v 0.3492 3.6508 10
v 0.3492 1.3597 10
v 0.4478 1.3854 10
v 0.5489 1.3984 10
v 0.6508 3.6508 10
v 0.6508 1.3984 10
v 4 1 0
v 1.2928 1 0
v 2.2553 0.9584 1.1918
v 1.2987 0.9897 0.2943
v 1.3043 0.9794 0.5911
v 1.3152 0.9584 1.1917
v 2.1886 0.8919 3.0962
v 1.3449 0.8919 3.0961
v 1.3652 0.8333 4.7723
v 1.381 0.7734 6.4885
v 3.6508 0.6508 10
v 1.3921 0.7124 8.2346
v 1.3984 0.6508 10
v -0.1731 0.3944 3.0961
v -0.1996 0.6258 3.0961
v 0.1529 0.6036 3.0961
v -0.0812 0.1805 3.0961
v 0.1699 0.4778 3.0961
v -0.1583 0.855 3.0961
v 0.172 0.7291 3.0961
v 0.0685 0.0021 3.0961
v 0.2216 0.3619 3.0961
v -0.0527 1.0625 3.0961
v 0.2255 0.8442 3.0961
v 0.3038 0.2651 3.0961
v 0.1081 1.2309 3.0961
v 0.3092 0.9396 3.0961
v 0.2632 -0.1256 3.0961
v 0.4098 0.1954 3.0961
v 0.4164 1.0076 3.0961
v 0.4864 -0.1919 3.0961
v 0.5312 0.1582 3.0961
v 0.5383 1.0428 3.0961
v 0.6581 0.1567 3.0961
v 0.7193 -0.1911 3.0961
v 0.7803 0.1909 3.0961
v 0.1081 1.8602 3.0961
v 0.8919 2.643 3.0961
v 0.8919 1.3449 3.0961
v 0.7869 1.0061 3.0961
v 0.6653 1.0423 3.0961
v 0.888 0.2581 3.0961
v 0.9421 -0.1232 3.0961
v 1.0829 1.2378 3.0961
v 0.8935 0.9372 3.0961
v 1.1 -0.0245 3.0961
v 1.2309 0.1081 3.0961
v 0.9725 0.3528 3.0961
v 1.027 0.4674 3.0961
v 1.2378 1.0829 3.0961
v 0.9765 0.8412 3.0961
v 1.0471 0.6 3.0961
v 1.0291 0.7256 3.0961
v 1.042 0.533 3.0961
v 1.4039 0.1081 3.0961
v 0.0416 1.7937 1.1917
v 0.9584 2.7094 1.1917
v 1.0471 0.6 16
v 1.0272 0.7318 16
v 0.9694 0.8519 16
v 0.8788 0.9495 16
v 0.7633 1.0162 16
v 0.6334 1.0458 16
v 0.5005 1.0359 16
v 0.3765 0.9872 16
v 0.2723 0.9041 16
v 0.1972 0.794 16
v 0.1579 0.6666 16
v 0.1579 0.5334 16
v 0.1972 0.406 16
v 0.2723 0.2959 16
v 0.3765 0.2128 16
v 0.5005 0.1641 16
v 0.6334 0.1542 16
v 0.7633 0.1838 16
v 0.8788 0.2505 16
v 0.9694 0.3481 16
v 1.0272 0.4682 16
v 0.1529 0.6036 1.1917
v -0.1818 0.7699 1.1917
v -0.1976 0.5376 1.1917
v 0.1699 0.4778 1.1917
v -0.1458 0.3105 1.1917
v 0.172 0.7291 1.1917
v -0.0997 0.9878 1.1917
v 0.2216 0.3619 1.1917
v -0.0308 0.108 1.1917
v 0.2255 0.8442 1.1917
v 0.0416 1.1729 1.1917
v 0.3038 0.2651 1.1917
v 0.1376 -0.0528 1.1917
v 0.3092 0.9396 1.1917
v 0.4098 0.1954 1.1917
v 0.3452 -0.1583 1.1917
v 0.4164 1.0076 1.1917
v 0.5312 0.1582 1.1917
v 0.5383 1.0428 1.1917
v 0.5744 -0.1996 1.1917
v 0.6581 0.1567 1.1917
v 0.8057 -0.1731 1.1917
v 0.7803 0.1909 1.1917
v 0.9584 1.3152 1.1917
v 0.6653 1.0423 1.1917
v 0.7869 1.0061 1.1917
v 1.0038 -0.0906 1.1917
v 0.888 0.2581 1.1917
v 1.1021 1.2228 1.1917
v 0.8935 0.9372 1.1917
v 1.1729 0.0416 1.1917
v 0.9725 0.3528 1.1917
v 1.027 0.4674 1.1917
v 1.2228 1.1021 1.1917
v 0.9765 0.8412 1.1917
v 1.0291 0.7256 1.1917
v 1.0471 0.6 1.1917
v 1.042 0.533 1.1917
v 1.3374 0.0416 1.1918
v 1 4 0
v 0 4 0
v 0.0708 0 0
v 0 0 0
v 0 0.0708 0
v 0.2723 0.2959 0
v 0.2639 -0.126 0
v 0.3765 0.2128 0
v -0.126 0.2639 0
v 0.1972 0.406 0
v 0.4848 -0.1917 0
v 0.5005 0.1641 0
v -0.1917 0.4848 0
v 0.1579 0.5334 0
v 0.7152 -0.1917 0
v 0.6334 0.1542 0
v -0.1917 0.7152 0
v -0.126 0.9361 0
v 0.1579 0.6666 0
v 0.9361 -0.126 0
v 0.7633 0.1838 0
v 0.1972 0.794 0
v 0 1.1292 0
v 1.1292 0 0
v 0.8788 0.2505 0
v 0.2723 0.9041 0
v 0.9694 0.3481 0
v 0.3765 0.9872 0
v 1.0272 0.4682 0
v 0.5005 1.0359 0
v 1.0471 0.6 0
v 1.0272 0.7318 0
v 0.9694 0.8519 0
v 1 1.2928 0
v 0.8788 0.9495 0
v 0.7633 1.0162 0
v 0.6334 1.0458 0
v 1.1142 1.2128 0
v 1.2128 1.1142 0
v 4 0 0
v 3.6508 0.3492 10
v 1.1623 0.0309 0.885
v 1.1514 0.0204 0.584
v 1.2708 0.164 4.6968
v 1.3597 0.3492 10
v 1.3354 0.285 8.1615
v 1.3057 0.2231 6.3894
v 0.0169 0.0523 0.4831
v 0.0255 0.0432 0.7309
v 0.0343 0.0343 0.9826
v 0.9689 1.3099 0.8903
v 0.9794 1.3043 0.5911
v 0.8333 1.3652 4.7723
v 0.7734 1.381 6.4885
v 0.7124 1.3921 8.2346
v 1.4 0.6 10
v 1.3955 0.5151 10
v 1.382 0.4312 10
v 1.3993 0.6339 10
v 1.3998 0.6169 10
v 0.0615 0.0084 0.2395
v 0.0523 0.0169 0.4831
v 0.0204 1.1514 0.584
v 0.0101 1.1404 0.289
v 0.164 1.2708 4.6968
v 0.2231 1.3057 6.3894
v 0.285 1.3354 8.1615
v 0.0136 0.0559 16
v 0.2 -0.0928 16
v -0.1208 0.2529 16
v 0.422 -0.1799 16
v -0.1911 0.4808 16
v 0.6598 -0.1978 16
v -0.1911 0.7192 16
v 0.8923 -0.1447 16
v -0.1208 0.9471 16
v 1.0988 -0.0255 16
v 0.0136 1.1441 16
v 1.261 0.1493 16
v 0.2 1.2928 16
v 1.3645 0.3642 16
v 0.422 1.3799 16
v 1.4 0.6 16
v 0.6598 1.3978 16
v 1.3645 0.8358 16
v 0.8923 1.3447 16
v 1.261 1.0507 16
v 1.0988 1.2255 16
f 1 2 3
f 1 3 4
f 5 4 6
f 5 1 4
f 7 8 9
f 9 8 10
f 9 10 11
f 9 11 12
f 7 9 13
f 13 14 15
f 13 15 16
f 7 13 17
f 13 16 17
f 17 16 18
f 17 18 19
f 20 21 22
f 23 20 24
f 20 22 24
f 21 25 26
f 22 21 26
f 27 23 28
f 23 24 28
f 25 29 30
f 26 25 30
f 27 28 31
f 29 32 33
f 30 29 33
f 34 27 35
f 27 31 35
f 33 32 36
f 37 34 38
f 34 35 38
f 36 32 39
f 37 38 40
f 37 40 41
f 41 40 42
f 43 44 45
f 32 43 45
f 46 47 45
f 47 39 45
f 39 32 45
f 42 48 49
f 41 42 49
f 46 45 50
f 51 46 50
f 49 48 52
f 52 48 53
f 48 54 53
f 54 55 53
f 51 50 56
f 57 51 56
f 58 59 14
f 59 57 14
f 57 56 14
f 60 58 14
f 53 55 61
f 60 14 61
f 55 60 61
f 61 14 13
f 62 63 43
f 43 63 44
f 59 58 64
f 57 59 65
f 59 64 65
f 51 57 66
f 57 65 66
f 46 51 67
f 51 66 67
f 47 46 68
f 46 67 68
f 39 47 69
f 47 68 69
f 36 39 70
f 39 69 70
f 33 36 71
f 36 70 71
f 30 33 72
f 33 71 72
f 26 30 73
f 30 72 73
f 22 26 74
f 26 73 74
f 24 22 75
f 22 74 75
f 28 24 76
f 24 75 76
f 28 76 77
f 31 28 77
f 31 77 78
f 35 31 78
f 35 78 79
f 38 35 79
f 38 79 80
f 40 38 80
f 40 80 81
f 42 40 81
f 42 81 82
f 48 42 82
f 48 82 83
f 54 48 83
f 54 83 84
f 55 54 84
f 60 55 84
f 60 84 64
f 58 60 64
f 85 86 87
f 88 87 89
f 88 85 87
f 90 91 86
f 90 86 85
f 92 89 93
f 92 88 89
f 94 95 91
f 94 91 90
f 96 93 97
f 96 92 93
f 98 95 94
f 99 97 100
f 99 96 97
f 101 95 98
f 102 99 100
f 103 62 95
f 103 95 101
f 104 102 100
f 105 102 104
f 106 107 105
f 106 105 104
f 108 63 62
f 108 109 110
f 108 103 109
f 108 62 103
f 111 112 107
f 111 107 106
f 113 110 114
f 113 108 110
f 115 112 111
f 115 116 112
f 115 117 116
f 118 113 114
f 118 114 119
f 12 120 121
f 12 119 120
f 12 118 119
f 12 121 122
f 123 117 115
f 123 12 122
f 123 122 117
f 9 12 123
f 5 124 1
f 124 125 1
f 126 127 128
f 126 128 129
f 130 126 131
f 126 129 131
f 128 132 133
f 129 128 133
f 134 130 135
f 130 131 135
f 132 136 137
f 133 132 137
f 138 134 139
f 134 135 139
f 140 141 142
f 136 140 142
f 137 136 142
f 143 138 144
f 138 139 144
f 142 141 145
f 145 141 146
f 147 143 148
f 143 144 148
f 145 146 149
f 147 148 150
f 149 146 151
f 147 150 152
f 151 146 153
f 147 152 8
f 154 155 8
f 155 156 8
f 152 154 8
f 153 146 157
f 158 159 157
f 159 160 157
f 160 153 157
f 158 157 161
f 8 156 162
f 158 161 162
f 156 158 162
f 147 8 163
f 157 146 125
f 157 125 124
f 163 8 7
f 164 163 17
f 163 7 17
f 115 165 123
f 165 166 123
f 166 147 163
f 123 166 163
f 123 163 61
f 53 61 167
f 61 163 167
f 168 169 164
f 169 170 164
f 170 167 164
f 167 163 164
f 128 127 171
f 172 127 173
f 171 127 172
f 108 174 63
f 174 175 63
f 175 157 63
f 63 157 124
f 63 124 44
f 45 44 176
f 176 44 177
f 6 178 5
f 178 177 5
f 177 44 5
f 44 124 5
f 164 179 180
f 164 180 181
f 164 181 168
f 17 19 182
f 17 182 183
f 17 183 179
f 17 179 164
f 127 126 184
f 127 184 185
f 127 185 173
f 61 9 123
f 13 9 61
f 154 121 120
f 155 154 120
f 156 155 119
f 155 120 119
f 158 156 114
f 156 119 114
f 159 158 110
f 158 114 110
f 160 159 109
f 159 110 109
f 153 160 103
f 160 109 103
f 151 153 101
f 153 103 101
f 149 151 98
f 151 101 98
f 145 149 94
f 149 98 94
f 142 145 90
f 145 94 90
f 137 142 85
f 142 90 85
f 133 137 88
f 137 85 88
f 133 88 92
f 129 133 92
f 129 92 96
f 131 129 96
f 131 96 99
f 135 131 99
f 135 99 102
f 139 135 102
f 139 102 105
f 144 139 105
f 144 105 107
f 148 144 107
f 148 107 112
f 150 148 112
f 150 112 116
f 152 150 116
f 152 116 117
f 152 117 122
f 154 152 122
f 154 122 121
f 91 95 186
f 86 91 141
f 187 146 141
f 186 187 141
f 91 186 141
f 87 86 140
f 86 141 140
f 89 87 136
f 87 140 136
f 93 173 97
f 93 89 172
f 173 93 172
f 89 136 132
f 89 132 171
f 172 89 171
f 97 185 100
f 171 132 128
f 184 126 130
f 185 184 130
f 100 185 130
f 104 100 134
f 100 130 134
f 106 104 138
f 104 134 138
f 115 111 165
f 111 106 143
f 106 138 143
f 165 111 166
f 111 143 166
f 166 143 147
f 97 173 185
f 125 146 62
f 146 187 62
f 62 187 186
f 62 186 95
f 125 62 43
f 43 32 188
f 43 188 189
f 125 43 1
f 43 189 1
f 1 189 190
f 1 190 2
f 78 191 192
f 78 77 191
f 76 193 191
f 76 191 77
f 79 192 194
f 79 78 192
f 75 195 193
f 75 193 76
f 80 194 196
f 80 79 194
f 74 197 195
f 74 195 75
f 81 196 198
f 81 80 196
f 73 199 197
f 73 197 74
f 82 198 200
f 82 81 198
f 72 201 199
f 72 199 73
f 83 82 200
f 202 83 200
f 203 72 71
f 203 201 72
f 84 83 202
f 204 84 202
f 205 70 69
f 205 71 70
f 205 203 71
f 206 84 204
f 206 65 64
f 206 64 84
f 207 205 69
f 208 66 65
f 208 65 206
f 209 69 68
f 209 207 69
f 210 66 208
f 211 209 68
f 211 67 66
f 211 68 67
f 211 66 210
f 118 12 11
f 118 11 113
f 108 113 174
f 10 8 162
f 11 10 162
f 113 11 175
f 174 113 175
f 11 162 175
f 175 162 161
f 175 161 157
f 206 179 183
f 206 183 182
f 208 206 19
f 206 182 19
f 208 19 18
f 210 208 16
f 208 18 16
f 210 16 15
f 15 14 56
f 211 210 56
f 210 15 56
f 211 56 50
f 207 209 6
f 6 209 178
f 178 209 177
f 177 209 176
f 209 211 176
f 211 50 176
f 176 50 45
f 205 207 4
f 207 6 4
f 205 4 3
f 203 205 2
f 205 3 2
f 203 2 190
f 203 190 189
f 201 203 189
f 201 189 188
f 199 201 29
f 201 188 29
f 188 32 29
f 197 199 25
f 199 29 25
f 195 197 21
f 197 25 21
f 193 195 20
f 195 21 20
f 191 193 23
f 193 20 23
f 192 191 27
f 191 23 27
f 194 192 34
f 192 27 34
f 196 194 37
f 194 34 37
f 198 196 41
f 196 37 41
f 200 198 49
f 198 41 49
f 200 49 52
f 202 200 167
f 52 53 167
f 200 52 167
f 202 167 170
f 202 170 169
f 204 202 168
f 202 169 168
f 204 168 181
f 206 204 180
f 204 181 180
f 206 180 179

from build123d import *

# Parameters (mm, degrees)
F1_DEPTH = 10
F1_TAPER = 2
F2_R     = 0.8
F3_DEPTH = 16
F4_R     = 0.4470893967
F5_DEPTH = 16.001
F7_W     = 2.1553949919
F7_H     = 1.9043667708
F8_DEPTH = 25


with BuildPart() as f1:
    # F0 (on Top) → F1 (new body)
    with BuildSketch(Plane.XY):
        Polygon((1, 4), (0, 4), (0, 0), (4, 0), (4, 1), (1, 1), align=None)
    extrude(amount=F1_DEPTH, taper=F1_TAPER)

    # F2 (on Top) → F3 (join)
    with BuildSketch(Plane.XY):
        with Locations((0.6, 0.6)):
            Circle(F2_R)
    extrude(amount=F3_DEPTH)

    # F4 (on face) → F5 (cut, through all)
    with BuildSketch(Plane.XY.offset(16)):
        with Locations((0.6, 0.6)):
            Circle(F4_R)
    extrude(amount=-F5_DEPTH, mode=Mode.SUBTRACT)

    # F7 (on face) → F8 (cut)
    with BuildSketch(Plane(origin=(2.0024329828, 1.9999985183, 8.50134e-05), x_dir=(0.7066765544, -0.7075367458, 3.0002e-05), z_dir=(-0.7075367451, -0.706676555, -3.00385e-05))):
        with Locations((-0.1619784161, 2.1438767435)):
            Rectangle(F7_W, F7_H)
    extrude(amount=F8_DEPTH, mode=Mode.SUBTRACT)


solid = f1.part
